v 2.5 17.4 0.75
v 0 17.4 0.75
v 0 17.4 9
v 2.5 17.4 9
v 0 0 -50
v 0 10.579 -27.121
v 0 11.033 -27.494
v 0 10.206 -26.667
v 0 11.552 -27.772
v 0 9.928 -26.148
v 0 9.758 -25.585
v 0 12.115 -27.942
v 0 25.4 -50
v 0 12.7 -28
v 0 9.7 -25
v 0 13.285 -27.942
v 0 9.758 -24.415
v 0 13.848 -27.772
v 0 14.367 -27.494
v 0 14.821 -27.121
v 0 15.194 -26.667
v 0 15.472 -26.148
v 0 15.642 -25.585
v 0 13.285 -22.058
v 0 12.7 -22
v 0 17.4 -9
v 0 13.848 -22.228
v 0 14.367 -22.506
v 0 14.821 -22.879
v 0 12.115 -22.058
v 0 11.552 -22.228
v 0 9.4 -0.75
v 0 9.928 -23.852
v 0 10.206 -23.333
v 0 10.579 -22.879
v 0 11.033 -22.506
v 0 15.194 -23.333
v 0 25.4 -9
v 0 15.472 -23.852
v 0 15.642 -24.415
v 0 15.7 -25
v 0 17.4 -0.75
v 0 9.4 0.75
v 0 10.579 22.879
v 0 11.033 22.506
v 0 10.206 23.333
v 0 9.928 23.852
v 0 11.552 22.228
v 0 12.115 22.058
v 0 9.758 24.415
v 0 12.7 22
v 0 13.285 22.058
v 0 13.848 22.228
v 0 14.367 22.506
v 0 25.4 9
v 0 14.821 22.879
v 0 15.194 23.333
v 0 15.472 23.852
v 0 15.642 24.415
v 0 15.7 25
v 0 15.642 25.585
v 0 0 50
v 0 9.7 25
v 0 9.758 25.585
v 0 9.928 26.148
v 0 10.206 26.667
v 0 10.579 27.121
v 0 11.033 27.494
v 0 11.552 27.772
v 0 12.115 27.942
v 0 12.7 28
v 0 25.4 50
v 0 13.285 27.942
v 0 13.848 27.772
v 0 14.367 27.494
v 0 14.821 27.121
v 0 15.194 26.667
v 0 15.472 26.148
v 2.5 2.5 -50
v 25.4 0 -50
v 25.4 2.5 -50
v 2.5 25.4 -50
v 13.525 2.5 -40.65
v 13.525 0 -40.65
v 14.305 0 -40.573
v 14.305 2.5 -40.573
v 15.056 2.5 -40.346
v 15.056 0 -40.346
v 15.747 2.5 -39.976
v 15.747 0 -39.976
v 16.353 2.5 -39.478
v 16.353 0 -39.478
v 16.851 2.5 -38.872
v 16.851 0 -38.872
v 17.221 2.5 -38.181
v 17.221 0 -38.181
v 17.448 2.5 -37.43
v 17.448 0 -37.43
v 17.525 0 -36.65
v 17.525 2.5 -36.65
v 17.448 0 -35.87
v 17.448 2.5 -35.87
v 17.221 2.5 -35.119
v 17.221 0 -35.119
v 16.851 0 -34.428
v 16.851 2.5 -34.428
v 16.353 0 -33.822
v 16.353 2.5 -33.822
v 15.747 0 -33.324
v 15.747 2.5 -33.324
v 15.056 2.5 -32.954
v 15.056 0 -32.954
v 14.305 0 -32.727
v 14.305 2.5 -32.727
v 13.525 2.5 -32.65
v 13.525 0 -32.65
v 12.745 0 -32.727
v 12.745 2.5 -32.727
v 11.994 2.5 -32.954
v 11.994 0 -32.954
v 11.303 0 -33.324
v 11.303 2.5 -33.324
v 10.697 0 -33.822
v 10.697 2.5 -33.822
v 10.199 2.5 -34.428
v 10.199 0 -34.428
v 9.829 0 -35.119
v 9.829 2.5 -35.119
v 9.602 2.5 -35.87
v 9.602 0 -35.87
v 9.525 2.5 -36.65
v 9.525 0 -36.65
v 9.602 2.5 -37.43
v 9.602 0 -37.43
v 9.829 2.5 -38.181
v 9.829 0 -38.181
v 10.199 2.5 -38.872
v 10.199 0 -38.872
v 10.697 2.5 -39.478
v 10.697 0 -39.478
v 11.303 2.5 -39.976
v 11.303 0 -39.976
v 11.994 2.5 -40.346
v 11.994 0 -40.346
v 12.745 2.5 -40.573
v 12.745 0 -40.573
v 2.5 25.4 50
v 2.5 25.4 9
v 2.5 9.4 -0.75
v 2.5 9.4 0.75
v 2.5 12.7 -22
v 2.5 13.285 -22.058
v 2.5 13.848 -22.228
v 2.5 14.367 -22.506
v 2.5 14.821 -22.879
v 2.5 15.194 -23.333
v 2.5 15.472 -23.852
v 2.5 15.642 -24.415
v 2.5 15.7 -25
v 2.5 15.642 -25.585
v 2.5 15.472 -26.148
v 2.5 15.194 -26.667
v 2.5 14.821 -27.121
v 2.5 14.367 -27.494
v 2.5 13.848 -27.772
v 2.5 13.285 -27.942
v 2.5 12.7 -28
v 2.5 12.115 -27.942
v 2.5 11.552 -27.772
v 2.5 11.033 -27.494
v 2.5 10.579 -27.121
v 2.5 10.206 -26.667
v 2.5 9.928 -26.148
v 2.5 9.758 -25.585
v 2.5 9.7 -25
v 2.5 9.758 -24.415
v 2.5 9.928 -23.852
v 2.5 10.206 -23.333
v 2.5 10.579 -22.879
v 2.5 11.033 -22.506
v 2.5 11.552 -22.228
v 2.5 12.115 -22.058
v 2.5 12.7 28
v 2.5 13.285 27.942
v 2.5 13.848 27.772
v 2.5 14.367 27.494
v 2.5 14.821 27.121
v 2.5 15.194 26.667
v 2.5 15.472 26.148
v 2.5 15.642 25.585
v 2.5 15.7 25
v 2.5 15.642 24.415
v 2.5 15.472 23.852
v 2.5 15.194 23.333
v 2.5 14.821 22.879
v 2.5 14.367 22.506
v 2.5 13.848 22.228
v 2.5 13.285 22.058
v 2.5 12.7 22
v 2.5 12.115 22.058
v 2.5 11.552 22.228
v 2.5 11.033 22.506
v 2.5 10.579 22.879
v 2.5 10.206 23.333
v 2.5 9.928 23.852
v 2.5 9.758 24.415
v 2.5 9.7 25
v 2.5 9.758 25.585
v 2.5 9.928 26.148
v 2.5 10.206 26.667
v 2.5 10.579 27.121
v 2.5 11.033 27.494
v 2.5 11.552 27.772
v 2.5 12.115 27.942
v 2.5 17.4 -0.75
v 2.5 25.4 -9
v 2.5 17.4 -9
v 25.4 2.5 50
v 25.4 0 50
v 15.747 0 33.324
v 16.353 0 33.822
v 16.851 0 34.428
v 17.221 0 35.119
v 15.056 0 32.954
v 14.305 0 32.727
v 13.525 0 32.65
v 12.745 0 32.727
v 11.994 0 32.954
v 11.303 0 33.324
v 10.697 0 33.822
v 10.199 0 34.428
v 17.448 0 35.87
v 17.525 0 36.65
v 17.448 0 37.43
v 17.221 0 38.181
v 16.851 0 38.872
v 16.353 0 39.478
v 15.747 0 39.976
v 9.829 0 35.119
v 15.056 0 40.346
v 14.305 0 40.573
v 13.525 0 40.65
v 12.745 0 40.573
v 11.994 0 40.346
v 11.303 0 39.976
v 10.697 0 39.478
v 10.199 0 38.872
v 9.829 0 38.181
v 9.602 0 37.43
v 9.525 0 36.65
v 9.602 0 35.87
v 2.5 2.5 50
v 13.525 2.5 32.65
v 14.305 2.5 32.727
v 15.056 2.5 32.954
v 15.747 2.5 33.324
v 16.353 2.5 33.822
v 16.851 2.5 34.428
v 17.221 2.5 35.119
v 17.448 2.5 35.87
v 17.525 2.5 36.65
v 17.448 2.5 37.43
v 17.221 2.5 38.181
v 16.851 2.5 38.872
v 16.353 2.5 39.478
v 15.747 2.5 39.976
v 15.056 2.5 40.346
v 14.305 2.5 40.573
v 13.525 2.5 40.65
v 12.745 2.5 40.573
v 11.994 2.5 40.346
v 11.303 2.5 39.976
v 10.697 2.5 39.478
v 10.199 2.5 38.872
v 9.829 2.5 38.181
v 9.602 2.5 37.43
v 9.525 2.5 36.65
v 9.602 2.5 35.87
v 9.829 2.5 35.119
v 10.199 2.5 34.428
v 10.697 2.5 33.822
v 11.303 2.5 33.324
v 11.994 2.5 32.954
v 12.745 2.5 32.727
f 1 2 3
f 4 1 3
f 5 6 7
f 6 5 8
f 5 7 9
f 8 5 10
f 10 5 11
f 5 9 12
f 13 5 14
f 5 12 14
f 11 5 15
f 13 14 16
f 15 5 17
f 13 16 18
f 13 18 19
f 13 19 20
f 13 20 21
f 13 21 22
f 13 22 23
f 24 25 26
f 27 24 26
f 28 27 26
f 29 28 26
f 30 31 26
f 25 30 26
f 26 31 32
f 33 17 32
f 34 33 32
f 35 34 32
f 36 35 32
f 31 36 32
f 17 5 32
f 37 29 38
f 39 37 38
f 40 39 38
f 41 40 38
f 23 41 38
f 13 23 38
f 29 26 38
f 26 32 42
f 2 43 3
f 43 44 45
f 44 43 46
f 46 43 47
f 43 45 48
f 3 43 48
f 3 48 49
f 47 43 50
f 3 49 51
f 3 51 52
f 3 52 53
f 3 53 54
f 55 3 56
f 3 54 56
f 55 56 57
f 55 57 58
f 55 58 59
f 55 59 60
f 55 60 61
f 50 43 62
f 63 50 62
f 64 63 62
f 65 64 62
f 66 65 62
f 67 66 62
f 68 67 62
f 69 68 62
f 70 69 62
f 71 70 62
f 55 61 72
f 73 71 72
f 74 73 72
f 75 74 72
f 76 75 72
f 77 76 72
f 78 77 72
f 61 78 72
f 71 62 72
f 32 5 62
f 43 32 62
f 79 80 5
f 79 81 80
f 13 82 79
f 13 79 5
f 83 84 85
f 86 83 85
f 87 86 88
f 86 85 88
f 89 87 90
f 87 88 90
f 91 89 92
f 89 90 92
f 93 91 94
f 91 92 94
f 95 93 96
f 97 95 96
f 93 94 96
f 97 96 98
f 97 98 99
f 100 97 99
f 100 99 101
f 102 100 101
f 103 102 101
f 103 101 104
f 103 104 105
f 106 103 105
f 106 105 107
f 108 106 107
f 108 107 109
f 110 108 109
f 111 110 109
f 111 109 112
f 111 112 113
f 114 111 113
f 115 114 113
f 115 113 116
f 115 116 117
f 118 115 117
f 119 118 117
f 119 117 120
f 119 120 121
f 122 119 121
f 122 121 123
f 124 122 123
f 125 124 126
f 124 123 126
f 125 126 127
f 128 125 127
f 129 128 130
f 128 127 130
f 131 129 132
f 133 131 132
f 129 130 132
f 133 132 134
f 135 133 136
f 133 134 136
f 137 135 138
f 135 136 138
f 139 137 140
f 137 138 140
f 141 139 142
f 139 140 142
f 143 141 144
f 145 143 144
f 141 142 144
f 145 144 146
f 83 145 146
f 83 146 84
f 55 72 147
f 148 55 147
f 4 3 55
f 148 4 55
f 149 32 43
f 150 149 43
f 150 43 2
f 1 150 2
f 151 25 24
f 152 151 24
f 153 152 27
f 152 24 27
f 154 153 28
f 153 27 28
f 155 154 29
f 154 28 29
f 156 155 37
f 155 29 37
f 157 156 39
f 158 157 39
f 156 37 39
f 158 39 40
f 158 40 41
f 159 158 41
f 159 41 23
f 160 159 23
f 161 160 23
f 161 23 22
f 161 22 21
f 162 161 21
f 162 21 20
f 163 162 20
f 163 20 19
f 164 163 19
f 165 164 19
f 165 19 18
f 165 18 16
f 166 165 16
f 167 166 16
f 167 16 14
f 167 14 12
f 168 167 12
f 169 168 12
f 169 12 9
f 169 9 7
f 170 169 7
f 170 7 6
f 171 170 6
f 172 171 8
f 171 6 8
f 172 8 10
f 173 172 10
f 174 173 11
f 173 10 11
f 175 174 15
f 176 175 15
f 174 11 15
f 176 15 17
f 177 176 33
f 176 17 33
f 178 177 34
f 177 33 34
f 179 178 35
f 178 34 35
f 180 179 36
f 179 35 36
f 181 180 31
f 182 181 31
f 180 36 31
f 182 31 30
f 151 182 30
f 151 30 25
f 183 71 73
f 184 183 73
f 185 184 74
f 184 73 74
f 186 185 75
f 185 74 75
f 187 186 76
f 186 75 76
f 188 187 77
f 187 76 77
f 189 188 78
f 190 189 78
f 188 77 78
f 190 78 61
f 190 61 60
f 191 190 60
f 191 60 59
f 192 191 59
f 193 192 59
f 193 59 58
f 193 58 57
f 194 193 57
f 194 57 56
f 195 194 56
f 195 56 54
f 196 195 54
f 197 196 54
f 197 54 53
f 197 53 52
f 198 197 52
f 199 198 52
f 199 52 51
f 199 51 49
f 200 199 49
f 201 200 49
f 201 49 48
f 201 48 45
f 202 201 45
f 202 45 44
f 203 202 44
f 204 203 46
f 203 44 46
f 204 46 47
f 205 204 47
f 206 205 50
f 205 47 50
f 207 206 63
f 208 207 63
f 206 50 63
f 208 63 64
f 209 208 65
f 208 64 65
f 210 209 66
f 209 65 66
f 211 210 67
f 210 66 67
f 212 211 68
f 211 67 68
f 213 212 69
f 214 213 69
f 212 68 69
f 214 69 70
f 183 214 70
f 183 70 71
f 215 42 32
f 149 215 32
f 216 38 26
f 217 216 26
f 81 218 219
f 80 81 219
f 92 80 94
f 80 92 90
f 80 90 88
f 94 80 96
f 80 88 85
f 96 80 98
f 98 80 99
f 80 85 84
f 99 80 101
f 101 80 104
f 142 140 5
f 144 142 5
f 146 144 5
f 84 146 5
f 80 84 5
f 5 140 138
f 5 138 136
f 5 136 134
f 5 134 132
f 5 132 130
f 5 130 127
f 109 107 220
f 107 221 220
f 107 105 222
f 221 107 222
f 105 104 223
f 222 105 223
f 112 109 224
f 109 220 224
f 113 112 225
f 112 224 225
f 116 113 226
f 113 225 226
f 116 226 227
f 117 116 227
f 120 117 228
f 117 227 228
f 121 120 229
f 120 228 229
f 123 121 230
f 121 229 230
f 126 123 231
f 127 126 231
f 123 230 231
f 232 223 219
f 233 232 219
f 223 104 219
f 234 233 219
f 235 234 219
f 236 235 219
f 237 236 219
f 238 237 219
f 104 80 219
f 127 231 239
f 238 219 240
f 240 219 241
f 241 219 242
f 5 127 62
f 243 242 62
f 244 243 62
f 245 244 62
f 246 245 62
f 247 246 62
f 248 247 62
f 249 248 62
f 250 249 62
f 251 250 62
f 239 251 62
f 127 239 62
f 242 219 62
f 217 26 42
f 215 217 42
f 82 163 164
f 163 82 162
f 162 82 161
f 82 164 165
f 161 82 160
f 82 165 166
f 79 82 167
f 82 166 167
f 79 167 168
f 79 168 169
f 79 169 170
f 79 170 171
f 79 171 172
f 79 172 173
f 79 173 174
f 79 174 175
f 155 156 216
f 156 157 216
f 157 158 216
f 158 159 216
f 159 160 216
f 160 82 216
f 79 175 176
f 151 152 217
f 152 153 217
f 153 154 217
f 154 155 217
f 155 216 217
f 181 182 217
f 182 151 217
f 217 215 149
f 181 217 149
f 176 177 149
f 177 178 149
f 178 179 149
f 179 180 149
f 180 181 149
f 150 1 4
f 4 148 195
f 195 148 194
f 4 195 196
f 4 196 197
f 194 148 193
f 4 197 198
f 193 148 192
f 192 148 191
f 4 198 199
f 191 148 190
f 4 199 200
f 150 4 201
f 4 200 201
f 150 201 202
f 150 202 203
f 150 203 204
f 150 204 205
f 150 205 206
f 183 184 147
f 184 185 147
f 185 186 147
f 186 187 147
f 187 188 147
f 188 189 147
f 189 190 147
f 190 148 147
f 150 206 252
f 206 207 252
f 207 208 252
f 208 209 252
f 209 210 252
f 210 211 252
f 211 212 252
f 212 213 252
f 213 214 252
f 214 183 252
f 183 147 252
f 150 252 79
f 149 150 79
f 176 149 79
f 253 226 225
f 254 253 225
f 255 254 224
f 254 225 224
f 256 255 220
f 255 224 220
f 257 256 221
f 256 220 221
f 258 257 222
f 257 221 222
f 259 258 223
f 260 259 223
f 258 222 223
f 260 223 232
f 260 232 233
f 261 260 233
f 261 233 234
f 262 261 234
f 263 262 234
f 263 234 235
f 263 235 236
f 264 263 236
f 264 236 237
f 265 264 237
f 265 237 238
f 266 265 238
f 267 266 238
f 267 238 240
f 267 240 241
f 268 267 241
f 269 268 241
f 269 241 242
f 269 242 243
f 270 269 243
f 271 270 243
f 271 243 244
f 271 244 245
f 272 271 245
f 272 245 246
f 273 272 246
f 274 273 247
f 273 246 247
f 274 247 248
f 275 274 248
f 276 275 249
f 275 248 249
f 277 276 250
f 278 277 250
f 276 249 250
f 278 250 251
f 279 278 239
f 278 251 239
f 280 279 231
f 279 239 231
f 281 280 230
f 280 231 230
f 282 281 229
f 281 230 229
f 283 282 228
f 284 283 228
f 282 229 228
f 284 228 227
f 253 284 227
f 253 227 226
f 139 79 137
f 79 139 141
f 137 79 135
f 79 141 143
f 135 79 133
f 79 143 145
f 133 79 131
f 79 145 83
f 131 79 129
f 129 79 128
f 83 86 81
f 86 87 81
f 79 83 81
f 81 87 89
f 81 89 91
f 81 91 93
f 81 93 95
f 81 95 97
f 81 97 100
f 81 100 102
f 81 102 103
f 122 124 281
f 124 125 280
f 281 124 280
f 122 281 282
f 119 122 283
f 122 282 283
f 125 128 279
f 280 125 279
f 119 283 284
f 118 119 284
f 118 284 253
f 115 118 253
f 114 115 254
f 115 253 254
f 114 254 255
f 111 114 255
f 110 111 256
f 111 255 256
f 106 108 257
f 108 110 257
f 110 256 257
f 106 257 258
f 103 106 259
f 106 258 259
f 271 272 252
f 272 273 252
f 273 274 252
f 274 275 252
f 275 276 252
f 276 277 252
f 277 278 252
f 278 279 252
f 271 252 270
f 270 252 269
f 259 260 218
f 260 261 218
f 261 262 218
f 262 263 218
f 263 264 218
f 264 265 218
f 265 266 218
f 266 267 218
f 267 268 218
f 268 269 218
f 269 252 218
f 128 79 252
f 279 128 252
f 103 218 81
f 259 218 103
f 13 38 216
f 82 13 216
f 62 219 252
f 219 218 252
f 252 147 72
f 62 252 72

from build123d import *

# Parameters (mm, degrees)
EXTRUDE_THIN1_DEPTH = 50
SKETCH7_R           = 3
CUT_EXTRUDE5_DEPTH  = 62.565574796
CUT_EXTRUDE4_REACH  = 63.566
SKETCH6_R           = 4


with BuildPart() as part:
    # Sketch1 → Extrude-Thin1 (new, symmetric)
    with BuildSketch(Plane.XY):
        Polygon((25.4, 0), (0, 0), (0, 25.4), (2.5, 25.4), (2.5, 2.5), (25.4, 2.5), align=None)
    extrude(amount=EXTRUDE_THIN1_DEPTH, both=True)

    # Sketch7 → Cut-Extrude5 (cut, through all)
    with BuildSketch(Plane.ZY):
        with Locations((-25, 12.7)):
            Circle(SKETCH7_R)
        with Locations((25, 12.7)):
            Circle(SKETCH7_R)
        Polygon((-9, 25.4), (-9, 17.4), (-0.75, 17.4), (-0.75, 9.4), (0.75, 9.4), (0.75, 17.4), (9, 17.4), (9, 25.4), align=None)
    extrude(amount=-CUT_EXTRUDE5_DEPTH, mode=Mode.SUBTRACT)

    # Sketch6 → Cut-Extrude4 (cut, up to next)
    with BuildSketch(Plane.XZ, mode=Mode.PRIVATE) as cut_extrude4_sk1:
        with Locations(Location((13.525, 36.65, 0), (0, 0, 270))):
            Circle(SKETCH6_R)
    cut_extrude4_tool1 = extrude(cut_extrude4_sk1.sketch, amount=-CUT_EXTRUDE4_REACH, mode=Mode.PRIVATE) & part.part
    # Sketch6 → Cut-Extrude4 (cut, up to next)
    with BuildSketch(Plane.XZ, mode=Mode.PRIVATE) as cut_extrude4_sk2:
        with Locations(Location((13.525, -36.65, 0), (0, 0, 270))):
            Circle(SKETCH6_R)
    cut_extrude4_tool2 = extrude(cut_extrude4_sk2.sketch, amount=-CUT_EXTRUDE4_REACH, mode=Mode.PRIVATE) & part.part
    add(cut_extrude4_tool1.solids().sort_by_distance((13.525, 0, 36.65))[0], mode=Mode.SUBTRACT)
    add(cut_extrude4_tool2.solids().sort_by_distance((13.525, 0, -36.65))[0], mode=Mode.SUBTRACT)


solid = part.part
